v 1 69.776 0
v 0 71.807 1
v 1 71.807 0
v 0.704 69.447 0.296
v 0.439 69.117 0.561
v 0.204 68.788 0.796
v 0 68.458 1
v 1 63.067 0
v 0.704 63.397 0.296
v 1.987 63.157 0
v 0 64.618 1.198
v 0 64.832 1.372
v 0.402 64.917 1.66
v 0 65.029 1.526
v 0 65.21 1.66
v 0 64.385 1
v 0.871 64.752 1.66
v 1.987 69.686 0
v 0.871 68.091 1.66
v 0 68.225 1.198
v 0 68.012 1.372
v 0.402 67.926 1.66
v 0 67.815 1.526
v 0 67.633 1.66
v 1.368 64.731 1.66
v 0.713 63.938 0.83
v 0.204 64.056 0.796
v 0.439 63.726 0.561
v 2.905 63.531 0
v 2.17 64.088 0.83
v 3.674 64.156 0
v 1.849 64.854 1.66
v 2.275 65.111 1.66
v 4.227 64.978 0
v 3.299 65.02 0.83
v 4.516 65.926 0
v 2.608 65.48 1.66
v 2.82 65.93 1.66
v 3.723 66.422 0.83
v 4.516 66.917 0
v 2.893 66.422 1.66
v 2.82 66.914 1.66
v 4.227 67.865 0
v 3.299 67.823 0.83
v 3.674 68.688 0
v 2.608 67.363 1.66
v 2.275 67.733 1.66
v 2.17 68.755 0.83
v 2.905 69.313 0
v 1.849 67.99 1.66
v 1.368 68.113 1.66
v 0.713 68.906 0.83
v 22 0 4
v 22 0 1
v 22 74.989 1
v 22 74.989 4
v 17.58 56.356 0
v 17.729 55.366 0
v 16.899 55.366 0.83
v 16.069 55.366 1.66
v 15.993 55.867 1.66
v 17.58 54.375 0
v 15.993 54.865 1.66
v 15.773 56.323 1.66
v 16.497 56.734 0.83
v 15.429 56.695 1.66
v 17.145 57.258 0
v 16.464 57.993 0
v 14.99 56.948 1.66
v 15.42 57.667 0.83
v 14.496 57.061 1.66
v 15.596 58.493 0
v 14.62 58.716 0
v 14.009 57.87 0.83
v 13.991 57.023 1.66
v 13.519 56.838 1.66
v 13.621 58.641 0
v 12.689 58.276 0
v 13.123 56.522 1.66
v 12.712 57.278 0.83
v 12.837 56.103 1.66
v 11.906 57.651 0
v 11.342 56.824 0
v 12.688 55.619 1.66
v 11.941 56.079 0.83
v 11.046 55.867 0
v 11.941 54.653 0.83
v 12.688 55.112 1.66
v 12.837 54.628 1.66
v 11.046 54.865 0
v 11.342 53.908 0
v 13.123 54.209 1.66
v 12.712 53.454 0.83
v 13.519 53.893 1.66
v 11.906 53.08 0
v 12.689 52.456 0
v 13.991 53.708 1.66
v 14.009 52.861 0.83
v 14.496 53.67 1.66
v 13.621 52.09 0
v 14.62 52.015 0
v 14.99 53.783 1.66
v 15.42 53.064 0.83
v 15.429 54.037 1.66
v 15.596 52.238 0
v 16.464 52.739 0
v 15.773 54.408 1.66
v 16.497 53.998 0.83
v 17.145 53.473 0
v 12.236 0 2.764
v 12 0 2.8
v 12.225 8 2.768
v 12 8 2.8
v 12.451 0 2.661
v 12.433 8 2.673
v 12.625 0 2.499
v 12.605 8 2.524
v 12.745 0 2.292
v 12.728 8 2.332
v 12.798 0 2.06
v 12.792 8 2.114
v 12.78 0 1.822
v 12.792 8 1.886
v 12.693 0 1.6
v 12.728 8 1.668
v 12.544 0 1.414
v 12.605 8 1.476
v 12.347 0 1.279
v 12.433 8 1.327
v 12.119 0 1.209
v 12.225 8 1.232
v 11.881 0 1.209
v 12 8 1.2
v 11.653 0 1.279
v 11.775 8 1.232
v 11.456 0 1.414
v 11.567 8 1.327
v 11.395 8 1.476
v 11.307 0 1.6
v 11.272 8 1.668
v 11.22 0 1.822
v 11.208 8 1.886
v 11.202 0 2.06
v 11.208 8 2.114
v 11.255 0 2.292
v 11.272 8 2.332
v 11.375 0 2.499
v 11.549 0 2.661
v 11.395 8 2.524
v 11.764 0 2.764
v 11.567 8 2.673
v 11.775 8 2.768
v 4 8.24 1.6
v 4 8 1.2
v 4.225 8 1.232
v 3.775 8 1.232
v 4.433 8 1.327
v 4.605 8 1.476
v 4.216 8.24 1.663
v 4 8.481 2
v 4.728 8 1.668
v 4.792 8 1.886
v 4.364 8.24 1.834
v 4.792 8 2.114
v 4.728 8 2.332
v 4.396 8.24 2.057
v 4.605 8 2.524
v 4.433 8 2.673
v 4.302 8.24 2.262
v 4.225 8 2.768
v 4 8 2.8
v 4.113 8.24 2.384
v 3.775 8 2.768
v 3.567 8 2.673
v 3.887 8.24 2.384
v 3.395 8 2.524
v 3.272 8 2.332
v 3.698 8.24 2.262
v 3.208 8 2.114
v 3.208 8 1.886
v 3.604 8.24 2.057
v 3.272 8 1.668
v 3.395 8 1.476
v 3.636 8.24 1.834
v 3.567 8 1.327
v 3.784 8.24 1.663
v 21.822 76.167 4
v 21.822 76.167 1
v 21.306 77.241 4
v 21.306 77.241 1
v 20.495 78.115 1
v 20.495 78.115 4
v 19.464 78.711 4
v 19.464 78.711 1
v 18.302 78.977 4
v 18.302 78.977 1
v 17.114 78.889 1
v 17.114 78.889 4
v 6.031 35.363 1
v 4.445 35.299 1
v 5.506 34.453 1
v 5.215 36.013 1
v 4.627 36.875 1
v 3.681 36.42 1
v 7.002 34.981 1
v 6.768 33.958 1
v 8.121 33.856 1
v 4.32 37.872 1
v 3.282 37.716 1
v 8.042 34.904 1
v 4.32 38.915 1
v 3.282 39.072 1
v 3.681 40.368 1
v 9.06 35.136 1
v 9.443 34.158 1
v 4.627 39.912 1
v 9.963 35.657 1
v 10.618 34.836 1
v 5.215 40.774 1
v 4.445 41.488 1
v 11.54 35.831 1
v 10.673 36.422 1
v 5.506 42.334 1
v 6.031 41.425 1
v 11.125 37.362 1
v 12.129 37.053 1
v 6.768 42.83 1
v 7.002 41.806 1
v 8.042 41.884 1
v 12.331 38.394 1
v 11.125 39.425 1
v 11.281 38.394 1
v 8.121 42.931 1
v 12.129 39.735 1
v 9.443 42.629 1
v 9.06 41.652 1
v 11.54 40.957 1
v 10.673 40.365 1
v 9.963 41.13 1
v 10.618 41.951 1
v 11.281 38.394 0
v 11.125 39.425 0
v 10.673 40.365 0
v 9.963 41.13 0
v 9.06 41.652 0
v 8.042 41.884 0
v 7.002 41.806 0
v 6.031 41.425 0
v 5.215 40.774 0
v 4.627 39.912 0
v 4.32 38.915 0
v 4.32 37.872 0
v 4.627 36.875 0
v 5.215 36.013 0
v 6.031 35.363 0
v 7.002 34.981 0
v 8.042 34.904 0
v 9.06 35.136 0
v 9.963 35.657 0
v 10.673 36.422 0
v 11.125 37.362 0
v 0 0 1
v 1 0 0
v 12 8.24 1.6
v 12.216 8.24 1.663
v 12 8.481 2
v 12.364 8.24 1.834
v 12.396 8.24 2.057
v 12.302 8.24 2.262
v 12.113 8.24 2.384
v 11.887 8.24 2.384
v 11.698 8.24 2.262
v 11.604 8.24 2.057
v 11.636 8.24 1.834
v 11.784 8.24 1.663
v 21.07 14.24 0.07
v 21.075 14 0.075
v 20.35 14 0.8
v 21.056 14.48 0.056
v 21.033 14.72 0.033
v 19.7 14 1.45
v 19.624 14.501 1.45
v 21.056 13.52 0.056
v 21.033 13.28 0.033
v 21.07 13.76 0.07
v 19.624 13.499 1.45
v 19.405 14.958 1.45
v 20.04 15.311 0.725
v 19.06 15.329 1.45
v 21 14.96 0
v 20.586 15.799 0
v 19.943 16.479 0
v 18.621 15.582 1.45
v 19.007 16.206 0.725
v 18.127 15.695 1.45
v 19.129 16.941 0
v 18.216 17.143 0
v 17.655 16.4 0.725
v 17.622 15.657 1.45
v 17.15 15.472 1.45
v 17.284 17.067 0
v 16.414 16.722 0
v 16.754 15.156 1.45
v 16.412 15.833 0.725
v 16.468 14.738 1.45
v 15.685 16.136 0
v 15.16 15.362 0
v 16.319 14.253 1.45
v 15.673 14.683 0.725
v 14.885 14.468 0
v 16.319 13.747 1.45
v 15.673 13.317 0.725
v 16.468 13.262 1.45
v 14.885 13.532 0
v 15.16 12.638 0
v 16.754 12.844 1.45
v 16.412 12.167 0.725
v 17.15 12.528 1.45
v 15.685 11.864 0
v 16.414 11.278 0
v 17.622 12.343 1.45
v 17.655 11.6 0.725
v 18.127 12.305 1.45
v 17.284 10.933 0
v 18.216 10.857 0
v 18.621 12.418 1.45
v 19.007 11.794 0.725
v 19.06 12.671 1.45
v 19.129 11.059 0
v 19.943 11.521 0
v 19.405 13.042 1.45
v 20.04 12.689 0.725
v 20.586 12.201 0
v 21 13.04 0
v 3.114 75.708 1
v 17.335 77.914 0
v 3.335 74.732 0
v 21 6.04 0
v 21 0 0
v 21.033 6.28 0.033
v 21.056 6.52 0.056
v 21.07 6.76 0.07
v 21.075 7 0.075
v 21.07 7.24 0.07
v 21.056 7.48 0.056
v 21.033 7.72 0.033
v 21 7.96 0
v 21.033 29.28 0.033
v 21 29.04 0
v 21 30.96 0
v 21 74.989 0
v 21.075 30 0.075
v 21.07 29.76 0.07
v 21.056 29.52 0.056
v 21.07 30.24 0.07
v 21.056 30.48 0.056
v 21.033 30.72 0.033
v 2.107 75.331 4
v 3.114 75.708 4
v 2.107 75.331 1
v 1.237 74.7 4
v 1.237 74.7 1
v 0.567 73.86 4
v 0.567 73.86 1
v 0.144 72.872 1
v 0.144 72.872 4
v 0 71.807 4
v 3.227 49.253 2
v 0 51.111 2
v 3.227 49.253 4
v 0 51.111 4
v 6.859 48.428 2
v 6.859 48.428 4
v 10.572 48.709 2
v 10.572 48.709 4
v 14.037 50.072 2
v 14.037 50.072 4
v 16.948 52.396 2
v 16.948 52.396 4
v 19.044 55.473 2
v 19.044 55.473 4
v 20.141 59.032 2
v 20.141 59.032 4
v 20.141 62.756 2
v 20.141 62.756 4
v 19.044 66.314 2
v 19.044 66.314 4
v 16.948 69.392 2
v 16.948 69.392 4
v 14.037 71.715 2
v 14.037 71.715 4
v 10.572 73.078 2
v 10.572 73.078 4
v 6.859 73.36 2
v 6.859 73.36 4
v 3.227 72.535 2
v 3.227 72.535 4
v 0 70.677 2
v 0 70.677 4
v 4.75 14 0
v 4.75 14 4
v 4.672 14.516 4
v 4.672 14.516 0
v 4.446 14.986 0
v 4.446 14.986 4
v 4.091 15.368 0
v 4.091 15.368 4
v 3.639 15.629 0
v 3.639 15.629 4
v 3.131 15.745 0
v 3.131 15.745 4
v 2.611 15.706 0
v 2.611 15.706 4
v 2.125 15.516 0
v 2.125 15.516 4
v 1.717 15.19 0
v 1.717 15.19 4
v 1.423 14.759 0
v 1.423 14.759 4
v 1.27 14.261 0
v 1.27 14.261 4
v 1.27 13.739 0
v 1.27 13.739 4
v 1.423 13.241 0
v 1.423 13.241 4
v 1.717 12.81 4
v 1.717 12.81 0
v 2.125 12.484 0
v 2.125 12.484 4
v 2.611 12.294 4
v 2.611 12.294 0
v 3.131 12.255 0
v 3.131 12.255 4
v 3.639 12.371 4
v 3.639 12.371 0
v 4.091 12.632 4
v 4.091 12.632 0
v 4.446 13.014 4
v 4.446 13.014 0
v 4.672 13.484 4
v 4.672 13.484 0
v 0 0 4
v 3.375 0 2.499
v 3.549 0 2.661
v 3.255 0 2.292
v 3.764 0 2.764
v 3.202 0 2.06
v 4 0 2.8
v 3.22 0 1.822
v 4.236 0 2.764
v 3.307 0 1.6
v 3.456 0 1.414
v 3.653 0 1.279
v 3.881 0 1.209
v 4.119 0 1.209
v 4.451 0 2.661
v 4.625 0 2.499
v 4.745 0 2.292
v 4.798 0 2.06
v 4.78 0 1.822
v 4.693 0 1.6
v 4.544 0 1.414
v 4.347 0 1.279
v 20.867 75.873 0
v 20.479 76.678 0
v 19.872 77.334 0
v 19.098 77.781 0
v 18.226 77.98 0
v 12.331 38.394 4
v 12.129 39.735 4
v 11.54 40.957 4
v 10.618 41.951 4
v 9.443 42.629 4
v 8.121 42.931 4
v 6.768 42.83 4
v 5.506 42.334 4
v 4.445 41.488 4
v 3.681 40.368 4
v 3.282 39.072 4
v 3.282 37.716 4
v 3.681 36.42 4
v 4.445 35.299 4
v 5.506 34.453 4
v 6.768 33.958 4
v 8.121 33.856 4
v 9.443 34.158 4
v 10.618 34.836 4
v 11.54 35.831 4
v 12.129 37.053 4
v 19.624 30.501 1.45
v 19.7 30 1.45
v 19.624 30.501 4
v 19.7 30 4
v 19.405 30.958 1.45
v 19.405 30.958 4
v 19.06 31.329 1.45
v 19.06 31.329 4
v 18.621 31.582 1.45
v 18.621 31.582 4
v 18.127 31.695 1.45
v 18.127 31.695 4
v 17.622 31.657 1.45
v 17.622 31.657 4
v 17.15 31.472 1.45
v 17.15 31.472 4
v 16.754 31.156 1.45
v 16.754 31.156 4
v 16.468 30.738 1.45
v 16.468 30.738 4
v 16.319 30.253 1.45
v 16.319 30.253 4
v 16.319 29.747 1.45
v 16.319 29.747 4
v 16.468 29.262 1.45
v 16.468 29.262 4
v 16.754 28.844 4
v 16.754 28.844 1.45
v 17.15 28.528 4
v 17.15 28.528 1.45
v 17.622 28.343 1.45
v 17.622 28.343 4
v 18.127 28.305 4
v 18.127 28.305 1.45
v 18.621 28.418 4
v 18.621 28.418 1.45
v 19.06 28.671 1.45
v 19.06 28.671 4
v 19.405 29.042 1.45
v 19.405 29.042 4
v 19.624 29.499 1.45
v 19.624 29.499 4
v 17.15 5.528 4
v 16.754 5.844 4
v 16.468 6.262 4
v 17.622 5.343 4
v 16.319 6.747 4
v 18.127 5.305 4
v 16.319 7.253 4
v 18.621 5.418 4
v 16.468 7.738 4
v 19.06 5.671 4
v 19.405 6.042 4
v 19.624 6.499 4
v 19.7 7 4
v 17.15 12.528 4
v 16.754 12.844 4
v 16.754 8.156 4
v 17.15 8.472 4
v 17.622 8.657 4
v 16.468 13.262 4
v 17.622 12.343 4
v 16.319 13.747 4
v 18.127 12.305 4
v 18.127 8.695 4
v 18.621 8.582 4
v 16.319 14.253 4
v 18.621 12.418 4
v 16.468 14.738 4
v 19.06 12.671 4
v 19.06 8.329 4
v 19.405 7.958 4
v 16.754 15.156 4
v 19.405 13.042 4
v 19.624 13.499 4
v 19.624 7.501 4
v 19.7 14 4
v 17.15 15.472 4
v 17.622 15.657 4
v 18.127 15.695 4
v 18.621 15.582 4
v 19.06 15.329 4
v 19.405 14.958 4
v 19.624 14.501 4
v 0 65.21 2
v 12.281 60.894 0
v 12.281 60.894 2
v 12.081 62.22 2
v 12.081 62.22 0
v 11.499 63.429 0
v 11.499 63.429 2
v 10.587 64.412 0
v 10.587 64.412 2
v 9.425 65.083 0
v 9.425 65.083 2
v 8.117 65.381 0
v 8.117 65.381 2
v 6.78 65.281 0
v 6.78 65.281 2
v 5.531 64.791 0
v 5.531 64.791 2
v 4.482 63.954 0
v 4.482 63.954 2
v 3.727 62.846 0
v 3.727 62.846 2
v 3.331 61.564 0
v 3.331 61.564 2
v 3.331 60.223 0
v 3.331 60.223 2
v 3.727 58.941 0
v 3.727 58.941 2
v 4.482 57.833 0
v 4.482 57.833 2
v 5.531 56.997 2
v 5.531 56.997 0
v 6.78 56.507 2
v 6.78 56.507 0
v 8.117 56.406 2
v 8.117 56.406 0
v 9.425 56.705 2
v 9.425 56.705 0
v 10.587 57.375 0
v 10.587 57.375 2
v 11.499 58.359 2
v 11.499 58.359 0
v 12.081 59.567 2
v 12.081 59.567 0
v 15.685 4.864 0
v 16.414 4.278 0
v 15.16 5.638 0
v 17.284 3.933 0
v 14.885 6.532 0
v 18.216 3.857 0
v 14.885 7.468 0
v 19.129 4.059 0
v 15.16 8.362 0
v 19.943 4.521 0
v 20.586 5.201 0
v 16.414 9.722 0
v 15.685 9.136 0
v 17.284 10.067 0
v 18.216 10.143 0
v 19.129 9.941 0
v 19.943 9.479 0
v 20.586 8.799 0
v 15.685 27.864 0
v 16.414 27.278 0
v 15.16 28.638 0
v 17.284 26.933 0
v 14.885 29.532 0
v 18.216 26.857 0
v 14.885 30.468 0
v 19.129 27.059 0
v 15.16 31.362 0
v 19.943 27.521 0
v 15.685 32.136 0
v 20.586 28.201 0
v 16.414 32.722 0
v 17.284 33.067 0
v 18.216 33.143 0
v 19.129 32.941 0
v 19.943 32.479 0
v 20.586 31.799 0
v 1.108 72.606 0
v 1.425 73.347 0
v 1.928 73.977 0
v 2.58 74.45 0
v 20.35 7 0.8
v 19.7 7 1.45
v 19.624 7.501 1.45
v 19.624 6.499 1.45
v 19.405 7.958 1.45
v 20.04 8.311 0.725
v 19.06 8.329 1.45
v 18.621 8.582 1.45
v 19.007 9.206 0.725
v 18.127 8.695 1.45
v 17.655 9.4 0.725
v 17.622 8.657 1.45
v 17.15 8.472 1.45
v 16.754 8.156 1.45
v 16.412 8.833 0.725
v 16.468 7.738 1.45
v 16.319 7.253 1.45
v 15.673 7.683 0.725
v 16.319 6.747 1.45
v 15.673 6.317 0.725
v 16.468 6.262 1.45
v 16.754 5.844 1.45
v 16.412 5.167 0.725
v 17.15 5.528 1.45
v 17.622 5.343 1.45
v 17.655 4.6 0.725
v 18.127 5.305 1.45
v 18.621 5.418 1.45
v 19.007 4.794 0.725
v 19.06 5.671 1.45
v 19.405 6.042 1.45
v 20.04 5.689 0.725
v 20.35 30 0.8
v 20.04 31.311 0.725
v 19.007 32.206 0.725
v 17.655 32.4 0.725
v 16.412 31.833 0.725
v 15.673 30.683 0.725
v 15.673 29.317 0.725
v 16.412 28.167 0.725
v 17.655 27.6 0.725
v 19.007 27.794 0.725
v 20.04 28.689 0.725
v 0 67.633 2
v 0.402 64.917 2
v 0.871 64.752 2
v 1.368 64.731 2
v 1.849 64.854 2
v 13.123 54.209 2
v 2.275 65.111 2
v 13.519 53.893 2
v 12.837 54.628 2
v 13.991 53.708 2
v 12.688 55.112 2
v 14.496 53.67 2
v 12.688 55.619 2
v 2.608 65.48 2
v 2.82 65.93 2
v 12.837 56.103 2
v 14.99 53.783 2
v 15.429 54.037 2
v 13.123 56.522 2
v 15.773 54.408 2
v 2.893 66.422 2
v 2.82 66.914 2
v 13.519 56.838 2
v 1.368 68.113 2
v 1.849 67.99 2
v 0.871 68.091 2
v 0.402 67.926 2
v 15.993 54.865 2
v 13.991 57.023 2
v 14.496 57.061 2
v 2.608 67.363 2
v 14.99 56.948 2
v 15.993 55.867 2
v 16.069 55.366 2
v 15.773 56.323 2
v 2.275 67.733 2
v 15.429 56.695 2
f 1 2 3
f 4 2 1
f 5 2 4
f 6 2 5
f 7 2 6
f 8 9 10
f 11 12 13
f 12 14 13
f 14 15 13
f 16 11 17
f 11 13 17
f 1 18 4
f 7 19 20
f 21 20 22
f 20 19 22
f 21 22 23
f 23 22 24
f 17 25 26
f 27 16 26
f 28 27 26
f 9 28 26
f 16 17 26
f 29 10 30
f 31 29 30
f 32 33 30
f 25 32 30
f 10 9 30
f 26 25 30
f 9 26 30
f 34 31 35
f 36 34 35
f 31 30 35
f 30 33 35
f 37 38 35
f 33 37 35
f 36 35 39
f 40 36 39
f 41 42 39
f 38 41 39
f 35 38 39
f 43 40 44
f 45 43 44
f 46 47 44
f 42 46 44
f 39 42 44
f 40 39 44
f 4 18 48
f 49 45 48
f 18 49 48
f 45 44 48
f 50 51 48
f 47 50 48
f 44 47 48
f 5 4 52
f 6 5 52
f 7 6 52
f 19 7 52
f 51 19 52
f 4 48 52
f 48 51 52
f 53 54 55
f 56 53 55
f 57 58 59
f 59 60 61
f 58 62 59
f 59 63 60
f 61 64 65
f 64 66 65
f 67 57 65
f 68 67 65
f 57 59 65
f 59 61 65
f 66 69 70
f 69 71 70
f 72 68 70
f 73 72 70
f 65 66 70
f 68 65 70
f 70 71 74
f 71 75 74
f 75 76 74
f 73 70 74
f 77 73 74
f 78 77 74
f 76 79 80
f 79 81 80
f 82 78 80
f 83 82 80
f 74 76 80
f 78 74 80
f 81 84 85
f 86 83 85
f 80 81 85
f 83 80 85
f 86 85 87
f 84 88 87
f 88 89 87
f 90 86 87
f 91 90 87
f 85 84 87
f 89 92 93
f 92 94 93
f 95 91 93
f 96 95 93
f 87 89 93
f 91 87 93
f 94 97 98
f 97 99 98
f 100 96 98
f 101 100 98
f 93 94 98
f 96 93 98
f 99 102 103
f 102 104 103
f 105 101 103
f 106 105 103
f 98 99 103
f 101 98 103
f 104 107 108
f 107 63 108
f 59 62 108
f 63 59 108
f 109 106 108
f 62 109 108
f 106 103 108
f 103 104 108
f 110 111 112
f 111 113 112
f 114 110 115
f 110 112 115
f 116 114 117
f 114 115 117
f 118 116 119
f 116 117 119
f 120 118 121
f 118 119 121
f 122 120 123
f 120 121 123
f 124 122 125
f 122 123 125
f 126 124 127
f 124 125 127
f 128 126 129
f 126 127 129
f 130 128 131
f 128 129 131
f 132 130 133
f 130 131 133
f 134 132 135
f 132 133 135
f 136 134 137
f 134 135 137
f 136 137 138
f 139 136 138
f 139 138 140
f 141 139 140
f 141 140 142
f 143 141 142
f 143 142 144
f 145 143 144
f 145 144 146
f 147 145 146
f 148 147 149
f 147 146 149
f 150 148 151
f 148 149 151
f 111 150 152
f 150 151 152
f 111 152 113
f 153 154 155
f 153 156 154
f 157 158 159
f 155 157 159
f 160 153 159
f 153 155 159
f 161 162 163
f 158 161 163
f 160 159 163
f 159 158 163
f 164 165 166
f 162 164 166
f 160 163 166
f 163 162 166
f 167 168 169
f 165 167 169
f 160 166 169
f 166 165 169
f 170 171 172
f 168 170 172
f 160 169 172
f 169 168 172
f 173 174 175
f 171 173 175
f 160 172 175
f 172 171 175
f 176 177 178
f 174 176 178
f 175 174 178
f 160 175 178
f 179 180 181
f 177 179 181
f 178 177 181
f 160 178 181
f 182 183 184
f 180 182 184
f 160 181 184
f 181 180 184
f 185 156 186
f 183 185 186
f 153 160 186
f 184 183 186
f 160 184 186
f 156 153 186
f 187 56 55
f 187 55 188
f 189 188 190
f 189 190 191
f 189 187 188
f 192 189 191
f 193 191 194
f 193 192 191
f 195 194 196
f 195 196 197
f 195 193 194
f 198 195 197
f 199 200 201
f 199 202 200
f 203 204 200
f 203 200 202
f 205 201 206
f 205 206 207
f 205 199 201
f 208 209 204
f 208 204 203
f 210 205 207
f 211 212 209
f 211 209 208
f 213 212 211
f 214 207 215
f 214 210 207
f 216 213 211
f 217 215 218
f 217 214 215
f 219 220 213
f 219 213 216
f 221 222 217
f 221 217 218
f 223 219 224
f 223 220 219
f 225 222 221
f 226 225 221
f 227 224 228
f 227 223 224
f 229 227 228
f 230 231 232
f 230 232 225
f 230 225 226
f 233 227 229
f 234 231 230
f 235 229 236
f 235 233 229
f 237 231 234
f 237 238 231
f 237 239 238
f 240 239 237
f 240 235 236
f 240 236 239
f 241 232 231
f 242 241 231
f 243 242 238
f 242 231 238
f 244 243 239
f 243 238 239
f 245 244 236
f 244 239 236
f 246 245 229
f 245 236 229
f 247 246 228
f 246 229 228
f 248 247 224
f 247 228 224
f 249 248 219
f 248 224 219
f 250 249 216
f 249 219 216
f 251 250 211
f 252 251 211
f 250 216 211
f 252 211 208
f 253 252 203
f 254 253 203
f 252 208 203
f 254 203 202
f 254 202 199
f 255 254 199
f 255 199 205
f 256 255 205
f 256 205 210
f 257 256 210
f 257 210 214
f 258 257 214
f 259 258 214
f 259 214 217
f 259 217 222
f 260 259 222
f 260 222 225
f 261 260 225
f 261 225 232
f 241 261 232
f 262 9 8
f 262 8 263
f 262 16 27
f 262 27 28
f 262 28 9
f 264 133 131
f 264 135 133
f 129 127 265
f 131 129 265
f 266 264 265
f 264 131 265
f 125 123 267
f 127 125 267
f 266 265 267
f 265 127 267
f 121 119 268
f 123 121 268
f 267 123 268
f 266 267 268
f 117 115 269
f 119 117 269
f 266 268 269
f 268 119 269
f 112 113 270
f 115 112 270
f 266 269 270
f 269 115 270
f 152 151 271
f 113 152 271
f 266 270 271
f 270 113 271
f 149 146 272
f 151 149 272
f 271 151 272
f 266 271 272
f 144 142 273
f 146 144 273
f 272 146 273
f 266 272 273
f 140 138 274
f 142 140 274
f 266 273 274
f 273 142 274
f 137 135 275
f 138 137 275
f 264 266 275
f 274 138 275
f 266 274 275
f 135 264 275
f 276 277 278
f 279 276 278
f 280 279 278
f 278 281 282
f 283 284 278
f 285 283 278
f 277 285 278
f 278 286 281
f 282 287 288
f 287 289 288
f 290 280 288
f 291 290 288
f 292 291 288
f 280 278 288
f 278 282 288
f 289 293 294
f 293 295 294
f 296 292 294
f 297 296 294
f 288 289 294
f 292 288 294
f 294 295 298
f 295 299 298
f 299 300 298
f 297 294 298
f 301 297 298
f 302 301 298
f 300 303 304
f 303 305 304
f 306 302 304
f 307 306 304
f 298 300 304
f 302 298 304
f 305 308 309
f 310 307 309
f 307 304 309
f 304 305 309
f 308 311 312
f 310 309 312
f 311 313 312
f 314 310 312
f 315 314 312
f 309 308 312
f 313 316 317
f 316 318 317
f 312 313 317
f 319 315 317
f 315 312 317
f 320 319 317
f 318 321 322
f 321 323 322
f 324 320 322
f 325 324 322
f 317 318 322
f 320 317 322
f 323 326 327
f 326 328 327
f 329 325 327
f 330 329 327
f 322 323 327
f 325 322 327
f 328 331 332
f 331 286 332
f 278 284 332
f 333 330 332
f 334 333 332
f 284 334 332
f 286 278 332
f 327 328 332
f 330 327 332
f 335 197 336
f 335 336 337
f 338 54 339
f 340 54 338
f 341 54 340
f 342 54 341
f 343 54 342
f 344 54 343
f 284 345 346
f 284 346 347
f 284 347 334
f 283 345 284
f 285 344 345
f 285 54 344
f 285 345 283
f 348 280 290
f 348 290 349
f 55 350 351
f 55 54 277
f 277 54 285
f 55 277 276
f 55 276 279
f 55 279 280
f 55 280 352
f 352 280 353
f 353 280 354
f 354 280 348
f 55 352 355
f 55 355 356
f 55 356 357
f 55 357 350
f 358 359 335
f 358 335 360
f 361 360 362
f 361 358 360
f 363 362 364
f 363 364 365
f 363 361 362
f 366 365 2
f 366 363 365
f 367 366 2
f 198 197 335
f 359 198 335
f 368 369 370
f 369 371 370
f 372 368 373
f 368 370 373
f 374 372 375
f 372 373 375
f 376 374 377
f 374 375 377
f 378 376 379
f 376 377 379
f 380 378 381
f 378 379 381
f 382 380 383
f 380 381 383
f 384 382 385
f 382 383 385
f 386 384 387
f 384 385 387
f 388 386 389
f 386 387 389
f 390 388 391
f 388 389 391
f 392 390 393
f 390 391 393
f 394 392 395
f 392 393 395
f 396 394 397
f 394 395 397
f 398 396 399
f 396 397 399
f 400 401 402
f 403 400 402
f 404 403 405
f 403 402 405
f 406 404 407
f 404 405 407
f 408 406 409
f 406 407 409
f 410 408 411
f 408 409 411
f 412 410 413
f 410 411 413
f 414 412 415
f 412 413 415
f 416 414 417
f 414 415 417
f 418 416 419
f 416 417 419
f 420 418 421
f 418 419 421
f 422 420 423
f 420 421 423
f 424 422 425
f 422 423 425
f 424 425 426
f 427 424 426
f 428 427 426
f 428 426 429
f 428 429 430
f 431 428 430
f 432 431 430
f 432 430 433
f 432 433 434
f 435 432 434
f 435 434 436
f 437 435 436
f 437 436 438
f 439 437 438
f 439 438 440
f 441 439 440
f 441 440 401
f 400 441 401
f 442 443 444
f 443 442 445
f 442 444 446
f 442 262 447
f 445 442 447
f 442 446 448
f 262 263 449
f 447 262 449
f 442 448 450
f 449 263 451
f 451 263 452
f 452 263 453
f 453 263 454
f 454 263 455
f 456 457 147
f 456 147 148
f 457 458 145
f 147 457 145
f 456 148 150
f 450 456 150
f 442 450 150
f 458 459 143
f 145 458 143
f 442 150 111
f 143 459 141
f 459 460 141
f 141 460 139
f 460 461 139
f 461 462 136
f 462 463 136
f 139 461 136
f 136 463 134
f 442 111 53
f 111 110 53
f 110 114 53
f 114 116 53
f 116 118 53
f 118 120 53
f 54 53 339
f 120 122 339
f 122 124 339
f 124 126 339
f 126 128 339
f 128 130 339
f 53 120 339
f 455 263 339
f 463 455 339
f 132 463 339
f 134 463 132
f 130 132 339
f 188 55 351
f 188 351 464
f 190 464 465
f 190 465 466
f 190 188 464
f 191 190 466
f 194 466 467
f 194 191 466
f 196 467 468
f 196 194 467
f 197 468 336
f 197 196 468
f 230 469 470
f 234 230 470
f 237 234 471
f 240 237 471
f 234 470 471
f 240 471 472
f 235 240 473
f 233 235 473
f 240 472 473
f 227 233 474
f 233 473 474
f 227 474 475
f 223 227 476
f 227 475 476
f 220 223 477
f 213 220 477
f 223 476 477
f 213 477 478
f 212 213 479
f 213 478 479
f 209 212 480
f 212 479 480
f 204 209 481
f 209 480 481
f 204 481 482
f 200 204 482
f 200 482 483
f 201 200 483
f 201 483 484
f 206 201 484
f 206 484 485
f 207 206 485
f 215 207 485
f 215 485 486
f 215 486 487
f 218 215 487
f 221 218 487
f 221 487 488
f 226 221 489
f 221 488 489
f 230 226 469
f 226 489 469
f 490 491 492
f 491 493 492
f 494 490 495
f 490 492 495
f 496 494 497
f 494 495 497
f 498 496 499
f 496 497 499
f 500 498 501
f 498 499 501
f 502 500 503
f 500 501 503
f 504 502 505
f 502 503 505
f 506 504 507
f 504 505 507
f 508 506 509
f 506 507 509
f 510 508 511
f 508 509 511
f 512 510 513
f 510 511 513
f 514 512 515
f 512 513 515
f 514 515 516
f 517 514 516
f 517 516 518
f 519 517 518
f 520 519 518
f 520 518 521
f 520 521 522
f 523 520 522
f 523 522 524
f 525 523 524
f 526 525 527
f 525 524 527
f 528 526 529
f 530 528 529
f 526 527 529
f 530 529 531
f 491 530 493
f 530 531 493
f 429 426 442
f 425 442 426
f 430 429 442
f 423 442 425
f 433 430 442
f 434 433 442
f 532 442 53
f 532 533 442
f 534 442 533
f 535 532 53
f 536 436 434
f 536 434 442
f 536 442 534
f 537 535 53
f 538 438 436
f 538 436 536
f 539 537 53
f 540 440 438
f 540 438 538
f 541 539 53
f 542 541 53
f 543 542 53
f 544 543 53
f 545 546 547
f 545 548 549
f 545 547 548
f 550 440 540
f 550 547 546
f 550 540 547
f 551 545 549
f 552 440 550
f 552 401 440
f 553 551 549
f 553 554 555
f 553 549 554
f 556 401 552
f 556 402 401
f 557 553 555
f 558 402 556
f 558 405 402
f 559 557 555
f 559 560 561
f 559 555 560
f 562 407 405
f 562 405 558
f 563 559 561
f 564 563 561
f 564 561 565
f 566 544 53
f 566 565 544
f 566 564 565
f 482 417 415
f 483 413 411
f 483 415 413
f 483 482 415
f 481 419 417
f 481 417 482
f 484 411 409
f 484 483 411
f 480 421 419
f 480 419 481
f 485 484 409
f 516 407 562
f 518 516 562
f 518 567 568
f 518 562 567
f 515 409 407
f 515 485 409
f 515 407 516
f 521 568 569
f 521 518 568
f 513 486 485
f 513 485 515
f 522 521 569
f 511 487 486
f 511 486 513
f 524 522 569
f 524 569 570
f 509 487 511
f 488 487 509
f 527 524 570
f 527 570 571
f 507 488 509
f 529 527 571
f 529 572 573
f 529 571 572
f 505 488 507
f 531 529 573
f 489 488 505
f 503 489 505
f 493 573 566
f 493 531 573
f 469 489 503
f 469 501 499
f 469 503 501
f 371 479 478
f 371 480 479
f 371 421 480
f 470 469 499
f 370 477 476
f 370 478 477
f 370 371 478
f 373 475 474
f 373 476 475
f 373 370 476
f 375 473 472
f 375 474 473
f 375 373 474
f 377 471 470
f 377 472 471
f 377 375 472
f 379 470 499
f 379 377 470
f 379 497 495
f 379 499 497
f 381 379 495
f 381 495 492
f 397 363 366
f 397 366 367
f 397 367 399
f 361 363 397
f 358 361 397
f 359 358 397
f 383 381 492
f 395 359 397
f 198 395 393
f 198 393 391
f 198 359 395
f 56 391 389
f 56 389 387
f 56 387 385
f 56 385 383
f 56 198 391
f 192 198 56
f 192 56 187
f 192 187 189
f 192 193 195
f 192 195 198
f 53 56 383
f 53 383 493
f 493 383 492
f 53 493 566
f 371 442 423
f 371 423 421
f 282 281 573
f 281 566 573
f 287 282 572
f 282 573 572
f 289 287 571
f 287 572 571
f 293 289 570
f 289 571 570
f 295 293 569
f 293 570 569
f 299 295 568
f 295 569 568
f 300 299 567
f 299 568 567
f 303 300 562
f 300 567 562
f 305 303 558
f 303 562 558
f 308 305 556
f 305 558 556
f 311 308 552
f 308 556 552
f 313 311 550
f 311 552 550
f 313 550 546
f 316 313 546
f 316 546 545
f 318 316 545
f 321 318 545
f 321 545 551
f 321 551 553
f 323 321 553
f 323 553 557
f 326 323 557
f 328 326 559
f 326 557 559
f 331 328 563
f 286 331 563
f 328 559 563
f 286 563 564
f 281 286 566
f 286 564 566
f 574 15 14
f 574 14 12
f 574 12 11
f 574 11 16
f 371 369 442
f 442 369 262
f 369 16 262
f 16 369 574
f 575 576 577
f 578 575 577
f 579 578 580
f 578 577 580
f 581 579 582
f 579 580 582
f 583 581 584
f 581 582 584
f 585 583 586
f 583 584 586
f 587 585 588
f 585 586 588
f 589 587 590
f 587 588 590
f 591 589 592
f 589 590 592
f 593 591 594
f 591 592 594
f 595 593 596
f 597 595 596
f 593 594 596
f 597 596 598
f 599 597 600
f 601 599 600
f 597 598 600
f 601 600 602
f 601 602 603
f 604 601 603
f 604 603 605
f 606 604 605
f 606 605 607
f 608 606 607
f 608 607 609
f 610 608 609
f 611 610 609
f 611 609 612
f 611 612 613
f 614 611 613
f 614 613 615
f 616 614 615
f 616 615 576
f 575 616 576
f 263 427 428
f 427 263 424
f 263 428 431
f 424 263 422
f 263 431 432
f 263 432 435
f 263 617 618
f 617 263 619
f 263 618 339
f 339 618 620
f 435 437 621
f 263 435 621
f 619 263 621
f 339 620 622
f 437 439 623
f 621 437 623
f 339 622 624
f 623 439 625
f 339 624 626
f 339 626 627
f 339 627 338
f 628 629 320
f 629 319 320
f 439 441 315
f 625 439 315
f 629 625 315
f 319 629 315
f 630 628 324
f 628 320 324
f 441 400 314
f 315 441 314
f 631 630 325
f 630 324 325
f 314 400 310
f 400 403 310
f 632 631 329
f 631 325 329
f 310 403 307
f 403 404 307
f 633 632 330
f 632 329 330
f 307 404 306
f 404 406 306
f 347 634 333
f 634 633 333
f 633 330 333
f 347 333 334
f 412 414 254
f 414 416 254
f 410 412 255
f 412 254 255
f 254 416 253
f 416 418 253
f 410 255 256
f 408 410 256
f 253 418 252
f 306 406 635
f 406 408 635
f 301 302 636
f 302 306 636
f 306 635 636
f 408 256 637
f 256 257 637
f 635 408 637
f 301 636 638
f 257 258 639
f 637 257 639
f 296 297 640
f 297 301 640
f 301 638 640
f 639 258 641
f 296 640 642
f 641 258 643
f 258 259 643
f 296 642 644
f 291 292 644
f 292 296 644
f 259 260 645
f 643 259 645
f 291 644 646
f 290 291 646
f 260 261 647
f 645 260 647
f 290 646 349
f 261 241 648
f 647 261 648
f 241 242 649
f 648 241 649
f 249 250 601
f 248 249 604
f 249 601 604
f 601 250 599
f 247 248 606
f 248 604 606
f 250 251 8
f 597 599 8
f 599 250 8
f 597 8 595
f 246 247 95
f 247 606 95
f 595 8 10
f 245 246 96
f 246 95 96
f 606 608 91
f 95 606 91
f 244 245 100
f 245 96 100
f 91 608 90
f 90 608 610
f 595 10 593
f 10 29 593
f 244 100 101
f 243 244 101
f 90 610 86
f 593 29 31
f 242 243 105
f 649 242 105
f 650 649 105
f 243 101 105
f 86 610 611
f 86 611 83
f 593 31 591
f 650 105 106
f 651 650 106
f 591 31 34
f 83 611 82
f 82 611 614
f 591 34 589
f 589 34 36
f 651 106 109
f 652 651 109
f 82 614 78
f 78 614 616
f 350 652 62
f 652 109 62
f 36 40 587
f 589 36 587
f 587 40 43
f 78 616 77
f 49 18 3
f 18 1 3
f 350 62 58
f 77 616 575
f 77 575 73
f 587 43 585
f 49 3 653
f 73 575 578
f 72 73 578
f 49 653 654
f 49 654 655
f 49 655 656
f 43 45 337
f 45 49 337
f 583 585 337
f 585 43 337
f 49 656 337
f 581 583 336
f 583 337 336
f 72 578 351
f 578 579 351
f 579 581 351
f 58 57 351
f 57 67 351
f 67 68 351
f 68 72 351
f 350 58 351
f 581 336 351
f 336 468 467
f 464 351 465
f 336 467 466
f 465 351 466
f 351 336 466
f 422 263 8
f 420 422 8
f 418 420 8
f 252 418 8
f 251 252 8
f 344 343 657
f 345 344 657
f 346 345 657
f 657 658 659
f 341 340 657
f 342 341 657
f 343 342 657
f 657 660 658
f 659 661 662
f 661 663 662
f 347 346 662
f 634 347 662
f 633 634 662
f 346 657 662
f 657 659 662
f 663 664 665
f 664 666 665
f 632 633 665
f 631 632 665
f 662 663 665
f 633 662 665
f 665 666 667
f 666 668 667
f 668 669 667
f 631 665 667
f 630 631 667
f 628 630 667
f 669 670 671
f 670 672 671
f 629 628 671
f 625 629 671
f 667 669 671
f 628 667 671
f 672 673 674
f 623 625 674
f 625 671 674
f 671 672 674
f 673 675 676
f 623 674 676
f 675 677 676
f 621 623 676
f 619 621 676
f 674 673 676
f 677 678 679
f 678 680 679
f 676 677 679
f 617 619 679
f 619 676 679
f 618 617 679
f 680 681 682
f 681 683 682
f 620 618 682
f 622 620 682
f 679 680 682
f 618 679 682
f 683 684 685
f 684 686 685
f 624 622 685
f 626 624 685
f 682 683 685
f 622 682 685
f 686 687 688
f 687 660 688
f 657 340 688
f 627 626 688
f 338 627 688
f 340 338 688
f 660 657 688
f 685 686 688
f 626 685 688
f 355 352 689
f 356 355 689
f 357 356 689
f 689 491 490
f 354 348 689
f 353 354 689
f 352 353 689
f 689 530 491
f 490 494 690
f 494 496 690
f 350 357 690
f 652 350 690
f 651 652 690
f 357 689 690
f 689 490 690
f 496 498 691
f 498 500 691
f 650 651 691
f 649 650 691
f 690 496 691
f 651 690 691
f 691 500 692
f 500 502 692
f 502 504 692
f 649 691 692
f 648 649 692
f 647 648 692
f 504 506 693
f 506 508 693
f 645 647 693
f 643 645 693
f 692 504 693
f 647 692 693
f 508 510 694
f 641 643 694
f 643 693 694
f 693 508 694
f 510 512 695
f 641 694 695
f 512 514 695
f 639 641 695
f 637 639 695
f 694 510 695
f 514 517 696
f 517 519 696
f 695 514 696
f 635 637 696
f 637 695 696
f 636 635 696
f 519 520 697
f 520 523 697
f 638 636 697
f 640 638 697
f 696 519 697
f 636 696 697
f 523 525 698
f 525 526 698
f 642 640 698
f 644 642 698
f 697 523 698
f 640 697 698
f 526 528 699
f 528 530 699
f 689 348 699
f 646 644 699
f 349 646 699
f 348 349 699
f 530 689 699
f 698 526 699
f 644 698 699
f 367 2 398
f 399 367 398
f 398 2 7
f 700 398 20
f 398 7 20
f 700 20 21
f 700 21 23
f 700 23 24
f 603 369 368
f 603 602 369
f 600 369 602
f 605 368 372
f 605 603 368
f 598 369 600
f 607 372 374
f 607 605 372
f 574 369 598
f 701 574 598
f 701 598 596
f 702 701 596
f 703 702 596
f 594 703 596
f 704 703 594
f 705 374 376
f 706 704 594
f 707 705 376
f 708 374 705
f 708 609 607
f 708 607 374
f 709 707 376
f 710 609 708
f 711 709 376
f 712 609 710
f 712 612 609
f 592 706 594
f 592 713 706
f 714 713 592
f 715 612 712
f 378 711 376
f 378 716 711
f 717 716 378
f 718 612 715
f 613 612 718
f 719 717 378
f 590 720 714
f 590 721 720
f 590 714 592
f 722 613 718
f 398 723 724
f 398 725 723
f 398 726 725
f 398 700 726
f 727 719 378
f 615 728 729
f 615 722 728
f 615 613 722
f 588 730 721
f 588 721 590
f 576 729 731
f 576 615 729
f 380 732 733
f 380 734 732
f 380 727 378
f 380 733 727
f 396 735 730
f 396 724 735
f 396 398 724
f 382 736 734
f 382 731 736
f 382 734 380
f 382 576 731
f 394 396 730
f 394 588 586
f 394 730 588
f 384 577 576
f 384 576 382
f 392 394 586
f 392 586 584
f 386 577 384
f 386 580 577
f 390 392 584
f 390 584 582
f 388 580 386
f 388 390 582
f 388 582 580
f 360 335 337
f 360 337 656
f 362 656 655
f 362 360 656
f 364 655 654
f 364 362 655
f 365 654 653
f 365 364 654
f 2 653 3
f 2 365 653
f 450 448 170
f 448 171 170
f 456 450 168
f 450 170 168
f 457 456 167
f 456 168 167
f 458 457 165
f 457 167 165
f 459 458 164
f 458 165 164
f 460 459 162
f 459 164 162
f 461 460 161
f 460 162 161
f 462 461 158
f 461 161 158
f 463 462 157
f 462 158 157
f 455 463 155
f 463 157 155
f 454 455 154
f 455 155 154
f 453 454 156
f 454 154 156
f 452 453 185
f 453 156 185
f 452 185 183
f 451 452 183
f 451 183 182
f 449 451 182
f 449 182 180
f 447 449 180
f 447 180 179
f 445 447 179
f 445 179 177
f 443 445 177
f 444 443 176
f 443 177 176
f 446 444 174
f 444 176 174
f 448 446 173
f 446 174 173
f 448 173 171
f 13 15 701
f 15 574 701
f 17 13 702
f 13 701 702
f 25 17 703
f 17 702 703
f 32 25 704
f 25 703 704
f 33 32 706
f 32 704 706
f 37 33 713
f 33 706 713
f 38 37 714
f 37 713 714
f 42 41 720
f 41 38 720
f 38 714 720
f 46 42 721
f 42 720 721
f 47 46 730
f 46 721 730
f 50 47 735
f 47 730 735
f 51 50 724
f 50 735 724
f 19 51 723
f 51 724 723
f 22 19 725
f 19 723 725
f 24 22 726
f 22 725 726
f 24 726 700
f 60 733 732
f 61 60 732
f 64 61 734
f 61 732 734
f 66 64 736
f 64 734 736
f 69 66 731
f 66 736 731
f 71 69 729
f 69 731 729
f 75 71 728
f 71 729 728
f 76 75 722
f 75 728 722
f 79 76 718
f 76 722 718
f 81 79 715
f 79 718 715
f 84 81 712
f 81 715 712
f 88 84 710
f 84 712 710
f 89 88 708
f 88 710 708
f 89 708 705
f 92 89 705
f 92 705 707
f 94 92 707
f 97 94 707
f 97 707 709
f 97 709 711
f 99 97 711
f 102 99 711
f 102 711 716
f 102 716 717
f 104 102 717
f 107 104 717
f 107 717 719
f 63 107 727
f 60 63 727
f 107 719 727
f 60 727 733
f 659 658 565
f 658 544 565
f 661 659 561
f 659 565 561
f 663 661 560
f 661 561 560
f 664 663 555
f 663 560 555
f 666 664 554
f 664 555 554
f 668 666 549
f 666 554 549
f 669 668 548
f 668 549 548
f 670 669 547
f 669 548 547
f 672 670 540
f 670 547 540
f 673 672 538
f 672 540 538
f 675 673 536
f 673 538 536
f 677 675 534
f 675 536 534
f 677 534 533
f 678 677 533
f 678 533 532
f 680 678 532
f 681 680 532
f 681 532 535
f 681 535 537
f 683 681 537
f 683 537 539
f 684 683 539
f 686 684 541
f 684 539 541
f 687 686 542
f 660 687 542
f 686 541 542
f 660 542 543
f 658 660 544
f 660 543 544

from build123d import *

# Parameters (mm, degrees)
RESSALTO_EXTRUS_O1_DEPTH                             = 4
FILETE1_R                                            = 4
CHANFRO1_SIZE                                        = 1
FURO_DE_DI_METRO_7_0_7_1_D                           = 7
ESCAREADO_PARA_PARAFUSO_COM_CABE_A_ESCAR_D           = 3.4
ESCAREADO_PARA_PARAFUSO_COM_CABE_A_ESCAR_CSINK_D     = 6.3
ESCAREADO_PARA_PARAFUSO_COM_CABE_A_ESCAR_CSINK_ANGLE = 90
BROCA_DE_ROSQUEAR_PARA_TARRAXA_DE_M21_D              = 1.6
BROCA_DE_ROSQUEAR_PARA_TARRAXA_DE_M21_DEPTH          = 8
BROCA_DE_ROSQUEAR_PARA_TARRAXA_DE_M21_TIP            = 0.480688495
FURO_DE_DI_METRO_9_0_9_3_D                           = 9
ESCAREADO_PARA_PARAFUSO_ALLEN_SEXTAVADO_D            = 3.4
ESCAREADO_PARA_PARAFUSO_ALLEN_SEXTAVADO_CSINK_D      = 6.72
ESCAREADO_PARA_PARAFUSO_ALLEN_SEXTAVADO_CSINK_ANGLE  = 90
ESCAREADO_PARA_PARAFUSO_COM_CABE_A_E_2_D             = 3.4
ESCAREADO_PARA_PARAFUSO_COM_CABE_A_E_2_DEPTH         = 4
ESCAREADO_PARA_PARAFUSO_COM_CABE_A_E_2_CSINK_D       = 6.3
ESCAREADO_PARA_PARAFUSO_COM_CABE_A_E_2_CSINK_ANGLE   = 90
ESCAREADO_PARA_PARAFUSO_COM_CABE_A_E_2_TIP           = 1.021463052
ESBO_O12_R                                           = 4.55
CORTE_EXTRUS_O1_DEPTH                                = 3
FURO_DE_DI_METRO_3_5_3_5_1_D                         = 3.5
ESBO_O36_R                                           = 12.5
CORTE_EXTRUS_O4_DEPTH                                = 2


with BuildPart() as part:
    # Esboço1 → Ressalto-extrusão1 (new body)
    with BuildSketch(Plane.XY):
        Polygon((0, 0), (22, 0), (22, 80), (0, 75), align=None)
    extrude(amount=RESSALTO_EXTRUS_O1_DEPTH)

    # Filete1
    filete1_edges = [part.edges().sort_by_distance(p)[0] for p in [
        (0, 75, 2),
        (22, 80, 2),
    ]]
    fillet(filete1_edges, radius=FILETE1_R)

    # Chanfro1
    chanfro1_edges = [part.edges().sort_by_distance(p)[0] for p in [
        (10.113515586, 77.298526269, 0),
        (0, 35.903542878, 0),
        (0.873825208, 74.302487761, 0),
        (20.495402006, 78.115078729, 0),
        (22, 37.494451969, 0),
    ]]
    chamfer(chanfro1_edges, length=CHANFRO1_SIZE)

    # Furo de diâmetro Ø7.0 (7)1 (through all)
    with Locations(Plane(origin=(7.780869527, 38.393713373, 0), x_dir=(-1, 0, 0), z_dir=(0, 0, -1))):
        with Locations((0, 0)):
            Hole(FURO_DE_DI_METRO_7_0_7_1_D / 2)

    # Escareado para parafuso com cabe_a escar (through all)
    with Locations(Plane(origin=(18, 7, 0), x_dir=(-1, 0, 0), z_dir=(0, 0, -1))):
        with Locations((0, 0), (0, 7)):
            CounterSinkHole(ESCAREADO_PARA_PARAFUSO_COM_CABE_A_ESCAR_D / 2, ESCAREADO_PARA_PARAFUSO_COM_CABE_A_ESCAR_CSINK_D / 2, counter_sink_angle=ESCAREADO_PARA_PARAFUSO_COM_CABE_A_ESCAR_CSINK_ANGLE)

    # Broca de rosquear para tarraxa de M21
    with Locations(Plane(origin=(4, 0, 2), x_dir=(0, 0, -1), z_dir=(0, -1, 0))):
        with Locations((0, 0), (0, 8)):
            Hole(BROCA_DE_ROSQUEAR_PARA_TARRAXA_DE_M21_D / 2, depth=BROCA_DE_ROSQUEAR_PARA_TARRAXA_DE_M21_DEPTH)
            with Locations((0, 0, -(BROCA_DE_ROSQUEAR_PARA_TARRAXA_DE_M21_DEPTH + BROCA_DE_ROSQUEAR_PARA_TARRAXA_DE_M21_TIP / 2))):  # 118° drill point
                Cone(0, BROCA_DE_ROSQUEAR_PARA_TARRAXA_DE_M21_D / 2, BROCA_DE_ROSQUEAR_PARA_TARRAXA_DE_M21_TIP, mode=Mode.SUBTRACT)

    # Furo de diâmetro Ø9.0 (9)3 (through all)
    with Locations(Plane(origin=(7.780869527, 60.893713373, 0), x_dir=(-1, 0, 0), z_dir=(0, 0, -1))):
        with Locations((0, 0)):
            Hole(FURO_DE_DI_METRO_9_0_9_3_D / 2)

    # Escareado para parafuso Allen sextavado escareado de M31 (through all)
    with Locations(Plane(origin=(14.368851738, 55.36573993, 0), x_dir=(-1, 0, 0), z_dir=(0, 0, -1))):
        with Locations((0, 0), (13.175964422, 11.055946886)):
            CounterSinkHole(ESCAREADO_PARA_PARAFUSO_ALLEN_SEXTAVADO_D / 2, ESCAREADO_PARA_PARAFUSO_ALLEN_SEXTAVADO_CSINK_D / 2, counter_sink_angle=ESCAREADO_PARA_PARAFUSO_ALLEN_SEXTAVADO_CSINK_ANGLE)

    # Escareado para parafuso com cabe_a e 2
    with Locations(Plane(origin=(18, 30, 0), x_dir=(-1, 0, 0), z_dir=(0, 0, -1))):
        with Locations((0, 0)):
            CounterSinkHole(ESCAREADO_PARA_PARAFUSO_COM_CABE_A_E_2_D / 2, ESCAREADO_PARA_PARAFUSO_COM_CABE_A_E_2_CSINK_D / 2, depth=ESCAREADO_PARA_PARAFUSO_COM_CABE_A_E_2_DEPTH, counter_sink_angle=ESCAREADO_PARA_PARAFUSO_COM_CABE_A_E_2_CSINK_ANGLE)
            with Locations((0, 0, -(ESCAREADO_PARA_PARAFUSO_COM_CABE_A_E_2_DEPTH + ESCAREADO_PARA_PARAFUSO_COM_CABE_A_E_2_TIP / 2))):  # 118° drill point
                Cone(0, ESCAREADO_PARA_PARAFUSO_COM_CABE_A_E_2_D / 2, ESCAREADO_PARA_PARAFUSO_COM_CABE_A_E_2_TIP, mode=Mode.SUBTRACT)

    # Esboço12 → Corte-extrusão1 (cut)
    with BuildSketch(Plane.XY.offset(4)):
        with Locations((7.780869527, 38.393713373)):
            Circle(ESBO_O12_R)
    extrude(amount=-CORTE_EXTRUS_O1_DEPTH, mode=Mode.SUBTRACT)

    # Furo de diâmetro Ø3.5 (3.5)1 (through all)
    with Locations(Plane(origin=(3, 14, 0), x_dir=(-1, 0, 0), z_dir=(0, 0, -1))):
        with Locations((0, 0)):
            Hole(FURO_DE_DI_METRO_3_5_3_5_1_D / 2)

    # Esboço36 → Corte-extrusão4 (cut)
    with BuildSketch(Plane.XY.offset(4)):
        with Locations((7.780869527, 60.893713373)):
            Circle(ESBO_O36_R)
    extrude(amount=-CORTE_EXTRUS_O4_DEPTH, mode=Mode.SUBTRACT)


solid = part.part
